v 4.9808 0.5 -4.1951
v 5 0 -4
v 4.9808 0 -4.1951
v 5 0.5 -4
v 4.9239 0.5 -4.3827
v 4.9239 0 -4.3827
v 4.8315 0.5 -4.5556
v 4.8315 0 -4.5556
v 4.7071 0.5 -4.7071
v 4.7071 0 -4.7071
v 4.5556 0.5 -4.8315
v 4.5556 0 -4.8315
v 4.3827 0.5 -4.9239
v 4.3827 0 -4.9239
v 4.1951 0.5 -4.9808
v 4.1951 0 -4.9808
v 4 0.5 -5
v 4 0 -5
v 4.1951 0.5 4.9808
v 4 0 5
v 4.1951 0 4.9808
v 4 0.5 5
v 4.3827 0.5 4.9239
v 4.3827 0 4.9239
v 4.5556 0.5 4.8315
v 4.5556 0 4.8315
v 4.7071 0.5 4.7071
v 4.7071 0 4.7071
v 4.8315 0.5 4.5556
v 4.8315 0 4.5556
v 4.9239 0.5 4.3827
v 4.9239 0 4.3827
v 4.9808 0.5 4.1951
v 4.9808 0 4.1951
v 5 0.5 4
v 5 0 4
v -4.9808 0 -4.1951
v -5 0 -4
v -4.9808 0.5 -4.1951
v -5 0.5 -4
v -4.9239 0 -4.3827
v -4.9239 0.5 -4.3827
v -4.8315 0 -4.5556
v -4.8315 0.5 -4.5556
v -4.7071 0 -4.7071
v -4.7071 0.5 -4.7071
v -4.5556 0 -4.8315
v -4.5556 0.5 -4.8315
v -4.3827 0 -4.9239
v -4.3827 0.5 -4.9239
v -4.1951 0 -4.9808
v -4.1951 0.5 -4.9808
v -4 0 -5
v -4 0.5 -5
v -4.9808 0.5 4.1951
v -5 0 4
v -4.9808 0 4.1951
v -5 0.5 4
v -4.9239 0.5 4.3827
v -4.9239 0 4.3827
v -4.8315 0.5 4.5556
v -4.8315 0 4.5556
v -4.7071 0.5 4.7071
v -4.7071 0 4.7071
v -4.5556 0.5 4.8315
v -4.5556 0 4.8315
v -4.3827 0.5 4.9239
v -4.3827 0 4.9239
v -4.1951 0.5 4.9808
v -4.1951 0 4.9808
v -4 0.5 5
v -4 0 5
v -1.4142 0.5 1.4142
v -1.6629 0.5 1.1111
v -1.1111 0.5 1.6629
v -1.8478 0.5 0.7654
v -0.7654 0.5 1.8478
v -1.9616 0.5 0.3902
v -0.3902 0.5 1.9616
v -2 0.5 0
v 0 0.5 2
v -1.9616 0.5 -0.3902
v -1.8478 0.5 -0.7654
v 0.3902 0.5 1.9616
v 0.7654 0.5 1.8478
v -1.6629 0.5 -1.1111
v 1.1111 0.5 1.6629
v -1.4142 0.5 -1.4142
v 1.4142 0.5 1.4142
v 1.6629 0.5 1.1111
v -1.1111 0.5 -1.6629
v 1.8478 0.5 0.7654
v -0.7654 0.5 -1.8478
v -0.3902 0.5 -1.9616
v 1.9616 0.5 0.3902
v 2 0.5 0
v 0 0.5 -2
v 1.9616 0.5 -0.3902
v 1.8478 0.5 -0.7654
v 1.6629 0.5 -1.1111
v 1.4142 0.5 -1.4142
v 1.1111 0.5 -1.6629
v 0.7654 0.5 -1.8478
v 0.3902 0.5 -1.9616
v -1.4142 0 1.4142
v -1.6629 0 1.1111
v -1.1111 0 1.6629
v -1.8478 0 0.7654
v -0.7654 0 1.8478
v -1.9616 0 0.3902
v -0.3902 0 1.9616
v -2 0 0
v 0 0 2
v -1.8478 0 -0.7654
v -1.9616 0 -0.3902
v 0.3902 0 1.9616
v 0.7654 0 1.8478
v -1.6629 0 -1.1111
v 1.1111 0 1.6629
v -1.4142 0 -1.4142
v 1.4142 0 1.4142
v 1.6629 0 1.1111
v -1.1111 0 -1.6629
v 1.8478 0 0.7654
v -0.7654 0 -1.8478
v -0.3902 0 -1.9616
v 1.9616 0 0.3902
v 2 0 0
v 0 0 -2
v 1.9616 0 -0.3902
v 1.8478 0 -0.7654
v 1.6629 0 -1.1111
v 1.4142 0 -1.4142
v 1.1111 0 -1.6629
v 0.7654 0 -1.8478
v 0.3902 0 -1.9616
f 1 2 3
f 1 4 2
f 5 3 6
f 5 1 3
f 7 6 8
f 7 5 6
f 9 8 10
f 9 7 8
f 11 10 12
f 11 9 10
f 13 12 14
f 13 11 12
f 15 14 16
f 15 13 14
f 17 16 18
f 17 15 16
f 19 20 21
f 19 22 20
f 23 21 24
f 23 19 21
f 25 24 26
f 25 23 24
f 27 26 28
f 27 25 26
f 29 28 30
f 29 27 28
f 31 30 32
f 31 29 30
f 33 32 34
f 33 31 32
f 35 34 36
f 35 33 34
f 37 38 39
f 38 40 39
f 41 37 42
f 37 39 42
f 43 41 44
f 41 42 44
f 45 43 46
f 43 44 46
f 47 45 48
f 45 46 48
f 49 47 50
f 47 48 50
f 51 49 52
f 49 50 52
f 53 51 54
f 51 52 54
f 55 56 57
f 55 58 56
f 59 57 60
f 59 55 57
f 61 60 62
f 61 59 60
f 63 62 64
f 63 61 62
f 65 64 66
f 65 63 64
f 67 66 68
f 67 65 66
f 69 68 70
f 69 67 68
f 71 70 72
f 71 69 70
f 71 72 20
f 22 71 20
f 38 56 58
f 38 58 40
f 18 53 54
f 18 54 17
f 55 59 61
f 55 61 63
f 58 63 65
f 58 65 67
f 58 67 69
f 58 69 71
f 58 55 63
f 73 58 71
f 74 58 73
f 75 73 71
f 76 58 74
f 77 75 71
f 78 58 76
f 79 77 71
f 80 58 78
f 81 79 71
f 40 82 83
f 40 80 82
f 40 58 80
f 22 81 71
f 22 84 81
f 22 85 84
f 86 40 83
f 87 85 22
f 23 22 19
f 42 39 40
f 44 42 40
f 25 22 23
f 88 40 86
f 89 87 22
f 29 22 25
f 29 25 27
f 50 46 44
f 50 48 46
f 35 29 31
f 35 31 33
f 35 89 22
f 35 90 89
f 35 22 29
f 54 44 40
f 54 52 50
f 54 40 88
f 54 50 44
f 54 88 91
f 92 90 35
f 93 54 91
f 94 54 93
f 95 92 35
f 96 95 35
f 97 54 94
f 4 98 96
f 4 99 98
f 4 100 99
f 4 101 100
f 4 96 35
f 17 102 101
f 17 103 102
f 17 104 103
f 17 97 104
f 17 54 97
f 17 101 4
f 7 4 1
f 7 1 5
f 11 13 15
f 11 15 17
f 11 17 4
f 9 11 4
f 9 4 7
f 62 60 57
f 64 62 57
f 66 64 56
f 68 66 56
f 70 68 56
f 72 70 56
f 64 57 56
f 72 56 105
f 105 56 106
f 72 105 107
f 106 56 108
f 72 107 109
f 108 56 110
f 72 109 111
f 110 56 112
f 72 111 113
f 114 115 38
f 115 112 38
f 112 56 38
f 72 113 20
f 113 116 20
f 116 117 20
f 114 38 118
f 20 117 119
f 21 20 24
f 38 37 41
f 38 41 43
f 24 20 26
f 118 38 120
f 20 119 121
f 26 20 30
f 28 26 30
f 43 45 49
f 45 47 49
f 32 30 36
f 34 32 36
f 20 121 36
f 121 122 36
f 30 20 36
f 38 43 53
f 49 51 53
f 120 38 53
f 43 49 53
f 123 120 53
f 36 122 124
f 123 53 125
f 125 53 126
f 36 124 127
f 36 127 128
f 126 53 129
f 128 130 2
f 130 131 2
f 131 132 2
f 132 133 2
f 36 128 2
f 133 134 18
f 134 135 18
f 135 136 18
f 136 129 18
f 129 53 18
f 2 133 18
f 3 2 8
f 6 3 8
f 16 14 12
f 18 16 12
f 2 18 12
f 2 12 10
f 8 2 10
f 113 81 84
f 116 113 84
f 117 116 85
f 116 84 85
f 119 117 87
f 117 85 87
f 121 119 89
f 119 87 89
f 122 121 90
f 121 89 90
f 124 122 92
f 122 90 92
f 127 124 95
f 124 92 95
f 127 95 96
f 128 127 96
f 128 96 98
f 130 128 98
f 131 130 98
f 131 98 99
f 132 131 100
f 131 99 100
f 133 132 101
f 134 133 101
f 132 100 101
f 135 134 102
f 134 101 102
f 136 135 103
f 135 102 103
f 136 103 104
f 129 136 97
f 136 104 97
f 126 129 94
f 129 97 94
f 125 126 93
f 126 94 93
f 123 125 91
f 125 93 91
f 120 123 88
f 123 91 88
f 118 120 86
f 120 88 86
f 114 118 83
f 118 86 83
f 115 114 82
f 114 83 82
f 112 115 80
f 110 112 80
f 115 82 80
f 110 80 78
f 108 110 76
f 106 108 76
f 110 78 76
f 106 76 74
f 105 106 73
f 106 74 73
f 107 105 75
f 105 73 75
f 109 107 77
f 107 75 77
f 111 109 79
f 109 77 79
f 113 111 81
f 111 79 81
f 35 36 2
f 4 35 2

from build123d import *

# Parameters (mm, degrees)
SKETCH2_W           = 10
SKETCH2_H           = 10
BOSS_EXTRUDE1_DEPTH = 0.5
FILLET1_R           = 1
SKETCH3_R           = 2
CUT_EXTRUDE1_DEPTH  = 0.5


with BuildPart() as part:
    # Sketch2 → Boss-Extrude1 (new body)
    with BuildSketch(Plane(origin=(0, 0, 0), x_dir=(1, 0, 0), z_dir=(0, 1, 0))):
        Rectangle(SKETCH2_W, SKETCH2_H)
    extrude(amount=BOSS_EXTRUDE1_DEPTH)

    # Fillet1
    fillet1_edges = [part.edges().sort_by_distance(p)[0] for p in [
        (-5, 0.25, -5),
        (5, 0.25, -5),
        (5, 0.25, 5),
        (-5, 0.25, 5),
    ]]
    fillet(fillet1_edges, radius=FILLET1_R)

    # Sketch3 → Cut-Extrude1 (cut)
    with BuildSketch(Plane(origin=(0, 0.5, 0), x_dir=(1, 0, 0), z_dir=(0, 1, 0))):
        with Locations(Location((0, 0, 0), (0, 0, 270))):
            Circle(SKETCH3_R)
    extrude(amount=-CUT_EXTRUDE1_DEPTH, mode=Mode.SUBTRACT)


solid = part.part
